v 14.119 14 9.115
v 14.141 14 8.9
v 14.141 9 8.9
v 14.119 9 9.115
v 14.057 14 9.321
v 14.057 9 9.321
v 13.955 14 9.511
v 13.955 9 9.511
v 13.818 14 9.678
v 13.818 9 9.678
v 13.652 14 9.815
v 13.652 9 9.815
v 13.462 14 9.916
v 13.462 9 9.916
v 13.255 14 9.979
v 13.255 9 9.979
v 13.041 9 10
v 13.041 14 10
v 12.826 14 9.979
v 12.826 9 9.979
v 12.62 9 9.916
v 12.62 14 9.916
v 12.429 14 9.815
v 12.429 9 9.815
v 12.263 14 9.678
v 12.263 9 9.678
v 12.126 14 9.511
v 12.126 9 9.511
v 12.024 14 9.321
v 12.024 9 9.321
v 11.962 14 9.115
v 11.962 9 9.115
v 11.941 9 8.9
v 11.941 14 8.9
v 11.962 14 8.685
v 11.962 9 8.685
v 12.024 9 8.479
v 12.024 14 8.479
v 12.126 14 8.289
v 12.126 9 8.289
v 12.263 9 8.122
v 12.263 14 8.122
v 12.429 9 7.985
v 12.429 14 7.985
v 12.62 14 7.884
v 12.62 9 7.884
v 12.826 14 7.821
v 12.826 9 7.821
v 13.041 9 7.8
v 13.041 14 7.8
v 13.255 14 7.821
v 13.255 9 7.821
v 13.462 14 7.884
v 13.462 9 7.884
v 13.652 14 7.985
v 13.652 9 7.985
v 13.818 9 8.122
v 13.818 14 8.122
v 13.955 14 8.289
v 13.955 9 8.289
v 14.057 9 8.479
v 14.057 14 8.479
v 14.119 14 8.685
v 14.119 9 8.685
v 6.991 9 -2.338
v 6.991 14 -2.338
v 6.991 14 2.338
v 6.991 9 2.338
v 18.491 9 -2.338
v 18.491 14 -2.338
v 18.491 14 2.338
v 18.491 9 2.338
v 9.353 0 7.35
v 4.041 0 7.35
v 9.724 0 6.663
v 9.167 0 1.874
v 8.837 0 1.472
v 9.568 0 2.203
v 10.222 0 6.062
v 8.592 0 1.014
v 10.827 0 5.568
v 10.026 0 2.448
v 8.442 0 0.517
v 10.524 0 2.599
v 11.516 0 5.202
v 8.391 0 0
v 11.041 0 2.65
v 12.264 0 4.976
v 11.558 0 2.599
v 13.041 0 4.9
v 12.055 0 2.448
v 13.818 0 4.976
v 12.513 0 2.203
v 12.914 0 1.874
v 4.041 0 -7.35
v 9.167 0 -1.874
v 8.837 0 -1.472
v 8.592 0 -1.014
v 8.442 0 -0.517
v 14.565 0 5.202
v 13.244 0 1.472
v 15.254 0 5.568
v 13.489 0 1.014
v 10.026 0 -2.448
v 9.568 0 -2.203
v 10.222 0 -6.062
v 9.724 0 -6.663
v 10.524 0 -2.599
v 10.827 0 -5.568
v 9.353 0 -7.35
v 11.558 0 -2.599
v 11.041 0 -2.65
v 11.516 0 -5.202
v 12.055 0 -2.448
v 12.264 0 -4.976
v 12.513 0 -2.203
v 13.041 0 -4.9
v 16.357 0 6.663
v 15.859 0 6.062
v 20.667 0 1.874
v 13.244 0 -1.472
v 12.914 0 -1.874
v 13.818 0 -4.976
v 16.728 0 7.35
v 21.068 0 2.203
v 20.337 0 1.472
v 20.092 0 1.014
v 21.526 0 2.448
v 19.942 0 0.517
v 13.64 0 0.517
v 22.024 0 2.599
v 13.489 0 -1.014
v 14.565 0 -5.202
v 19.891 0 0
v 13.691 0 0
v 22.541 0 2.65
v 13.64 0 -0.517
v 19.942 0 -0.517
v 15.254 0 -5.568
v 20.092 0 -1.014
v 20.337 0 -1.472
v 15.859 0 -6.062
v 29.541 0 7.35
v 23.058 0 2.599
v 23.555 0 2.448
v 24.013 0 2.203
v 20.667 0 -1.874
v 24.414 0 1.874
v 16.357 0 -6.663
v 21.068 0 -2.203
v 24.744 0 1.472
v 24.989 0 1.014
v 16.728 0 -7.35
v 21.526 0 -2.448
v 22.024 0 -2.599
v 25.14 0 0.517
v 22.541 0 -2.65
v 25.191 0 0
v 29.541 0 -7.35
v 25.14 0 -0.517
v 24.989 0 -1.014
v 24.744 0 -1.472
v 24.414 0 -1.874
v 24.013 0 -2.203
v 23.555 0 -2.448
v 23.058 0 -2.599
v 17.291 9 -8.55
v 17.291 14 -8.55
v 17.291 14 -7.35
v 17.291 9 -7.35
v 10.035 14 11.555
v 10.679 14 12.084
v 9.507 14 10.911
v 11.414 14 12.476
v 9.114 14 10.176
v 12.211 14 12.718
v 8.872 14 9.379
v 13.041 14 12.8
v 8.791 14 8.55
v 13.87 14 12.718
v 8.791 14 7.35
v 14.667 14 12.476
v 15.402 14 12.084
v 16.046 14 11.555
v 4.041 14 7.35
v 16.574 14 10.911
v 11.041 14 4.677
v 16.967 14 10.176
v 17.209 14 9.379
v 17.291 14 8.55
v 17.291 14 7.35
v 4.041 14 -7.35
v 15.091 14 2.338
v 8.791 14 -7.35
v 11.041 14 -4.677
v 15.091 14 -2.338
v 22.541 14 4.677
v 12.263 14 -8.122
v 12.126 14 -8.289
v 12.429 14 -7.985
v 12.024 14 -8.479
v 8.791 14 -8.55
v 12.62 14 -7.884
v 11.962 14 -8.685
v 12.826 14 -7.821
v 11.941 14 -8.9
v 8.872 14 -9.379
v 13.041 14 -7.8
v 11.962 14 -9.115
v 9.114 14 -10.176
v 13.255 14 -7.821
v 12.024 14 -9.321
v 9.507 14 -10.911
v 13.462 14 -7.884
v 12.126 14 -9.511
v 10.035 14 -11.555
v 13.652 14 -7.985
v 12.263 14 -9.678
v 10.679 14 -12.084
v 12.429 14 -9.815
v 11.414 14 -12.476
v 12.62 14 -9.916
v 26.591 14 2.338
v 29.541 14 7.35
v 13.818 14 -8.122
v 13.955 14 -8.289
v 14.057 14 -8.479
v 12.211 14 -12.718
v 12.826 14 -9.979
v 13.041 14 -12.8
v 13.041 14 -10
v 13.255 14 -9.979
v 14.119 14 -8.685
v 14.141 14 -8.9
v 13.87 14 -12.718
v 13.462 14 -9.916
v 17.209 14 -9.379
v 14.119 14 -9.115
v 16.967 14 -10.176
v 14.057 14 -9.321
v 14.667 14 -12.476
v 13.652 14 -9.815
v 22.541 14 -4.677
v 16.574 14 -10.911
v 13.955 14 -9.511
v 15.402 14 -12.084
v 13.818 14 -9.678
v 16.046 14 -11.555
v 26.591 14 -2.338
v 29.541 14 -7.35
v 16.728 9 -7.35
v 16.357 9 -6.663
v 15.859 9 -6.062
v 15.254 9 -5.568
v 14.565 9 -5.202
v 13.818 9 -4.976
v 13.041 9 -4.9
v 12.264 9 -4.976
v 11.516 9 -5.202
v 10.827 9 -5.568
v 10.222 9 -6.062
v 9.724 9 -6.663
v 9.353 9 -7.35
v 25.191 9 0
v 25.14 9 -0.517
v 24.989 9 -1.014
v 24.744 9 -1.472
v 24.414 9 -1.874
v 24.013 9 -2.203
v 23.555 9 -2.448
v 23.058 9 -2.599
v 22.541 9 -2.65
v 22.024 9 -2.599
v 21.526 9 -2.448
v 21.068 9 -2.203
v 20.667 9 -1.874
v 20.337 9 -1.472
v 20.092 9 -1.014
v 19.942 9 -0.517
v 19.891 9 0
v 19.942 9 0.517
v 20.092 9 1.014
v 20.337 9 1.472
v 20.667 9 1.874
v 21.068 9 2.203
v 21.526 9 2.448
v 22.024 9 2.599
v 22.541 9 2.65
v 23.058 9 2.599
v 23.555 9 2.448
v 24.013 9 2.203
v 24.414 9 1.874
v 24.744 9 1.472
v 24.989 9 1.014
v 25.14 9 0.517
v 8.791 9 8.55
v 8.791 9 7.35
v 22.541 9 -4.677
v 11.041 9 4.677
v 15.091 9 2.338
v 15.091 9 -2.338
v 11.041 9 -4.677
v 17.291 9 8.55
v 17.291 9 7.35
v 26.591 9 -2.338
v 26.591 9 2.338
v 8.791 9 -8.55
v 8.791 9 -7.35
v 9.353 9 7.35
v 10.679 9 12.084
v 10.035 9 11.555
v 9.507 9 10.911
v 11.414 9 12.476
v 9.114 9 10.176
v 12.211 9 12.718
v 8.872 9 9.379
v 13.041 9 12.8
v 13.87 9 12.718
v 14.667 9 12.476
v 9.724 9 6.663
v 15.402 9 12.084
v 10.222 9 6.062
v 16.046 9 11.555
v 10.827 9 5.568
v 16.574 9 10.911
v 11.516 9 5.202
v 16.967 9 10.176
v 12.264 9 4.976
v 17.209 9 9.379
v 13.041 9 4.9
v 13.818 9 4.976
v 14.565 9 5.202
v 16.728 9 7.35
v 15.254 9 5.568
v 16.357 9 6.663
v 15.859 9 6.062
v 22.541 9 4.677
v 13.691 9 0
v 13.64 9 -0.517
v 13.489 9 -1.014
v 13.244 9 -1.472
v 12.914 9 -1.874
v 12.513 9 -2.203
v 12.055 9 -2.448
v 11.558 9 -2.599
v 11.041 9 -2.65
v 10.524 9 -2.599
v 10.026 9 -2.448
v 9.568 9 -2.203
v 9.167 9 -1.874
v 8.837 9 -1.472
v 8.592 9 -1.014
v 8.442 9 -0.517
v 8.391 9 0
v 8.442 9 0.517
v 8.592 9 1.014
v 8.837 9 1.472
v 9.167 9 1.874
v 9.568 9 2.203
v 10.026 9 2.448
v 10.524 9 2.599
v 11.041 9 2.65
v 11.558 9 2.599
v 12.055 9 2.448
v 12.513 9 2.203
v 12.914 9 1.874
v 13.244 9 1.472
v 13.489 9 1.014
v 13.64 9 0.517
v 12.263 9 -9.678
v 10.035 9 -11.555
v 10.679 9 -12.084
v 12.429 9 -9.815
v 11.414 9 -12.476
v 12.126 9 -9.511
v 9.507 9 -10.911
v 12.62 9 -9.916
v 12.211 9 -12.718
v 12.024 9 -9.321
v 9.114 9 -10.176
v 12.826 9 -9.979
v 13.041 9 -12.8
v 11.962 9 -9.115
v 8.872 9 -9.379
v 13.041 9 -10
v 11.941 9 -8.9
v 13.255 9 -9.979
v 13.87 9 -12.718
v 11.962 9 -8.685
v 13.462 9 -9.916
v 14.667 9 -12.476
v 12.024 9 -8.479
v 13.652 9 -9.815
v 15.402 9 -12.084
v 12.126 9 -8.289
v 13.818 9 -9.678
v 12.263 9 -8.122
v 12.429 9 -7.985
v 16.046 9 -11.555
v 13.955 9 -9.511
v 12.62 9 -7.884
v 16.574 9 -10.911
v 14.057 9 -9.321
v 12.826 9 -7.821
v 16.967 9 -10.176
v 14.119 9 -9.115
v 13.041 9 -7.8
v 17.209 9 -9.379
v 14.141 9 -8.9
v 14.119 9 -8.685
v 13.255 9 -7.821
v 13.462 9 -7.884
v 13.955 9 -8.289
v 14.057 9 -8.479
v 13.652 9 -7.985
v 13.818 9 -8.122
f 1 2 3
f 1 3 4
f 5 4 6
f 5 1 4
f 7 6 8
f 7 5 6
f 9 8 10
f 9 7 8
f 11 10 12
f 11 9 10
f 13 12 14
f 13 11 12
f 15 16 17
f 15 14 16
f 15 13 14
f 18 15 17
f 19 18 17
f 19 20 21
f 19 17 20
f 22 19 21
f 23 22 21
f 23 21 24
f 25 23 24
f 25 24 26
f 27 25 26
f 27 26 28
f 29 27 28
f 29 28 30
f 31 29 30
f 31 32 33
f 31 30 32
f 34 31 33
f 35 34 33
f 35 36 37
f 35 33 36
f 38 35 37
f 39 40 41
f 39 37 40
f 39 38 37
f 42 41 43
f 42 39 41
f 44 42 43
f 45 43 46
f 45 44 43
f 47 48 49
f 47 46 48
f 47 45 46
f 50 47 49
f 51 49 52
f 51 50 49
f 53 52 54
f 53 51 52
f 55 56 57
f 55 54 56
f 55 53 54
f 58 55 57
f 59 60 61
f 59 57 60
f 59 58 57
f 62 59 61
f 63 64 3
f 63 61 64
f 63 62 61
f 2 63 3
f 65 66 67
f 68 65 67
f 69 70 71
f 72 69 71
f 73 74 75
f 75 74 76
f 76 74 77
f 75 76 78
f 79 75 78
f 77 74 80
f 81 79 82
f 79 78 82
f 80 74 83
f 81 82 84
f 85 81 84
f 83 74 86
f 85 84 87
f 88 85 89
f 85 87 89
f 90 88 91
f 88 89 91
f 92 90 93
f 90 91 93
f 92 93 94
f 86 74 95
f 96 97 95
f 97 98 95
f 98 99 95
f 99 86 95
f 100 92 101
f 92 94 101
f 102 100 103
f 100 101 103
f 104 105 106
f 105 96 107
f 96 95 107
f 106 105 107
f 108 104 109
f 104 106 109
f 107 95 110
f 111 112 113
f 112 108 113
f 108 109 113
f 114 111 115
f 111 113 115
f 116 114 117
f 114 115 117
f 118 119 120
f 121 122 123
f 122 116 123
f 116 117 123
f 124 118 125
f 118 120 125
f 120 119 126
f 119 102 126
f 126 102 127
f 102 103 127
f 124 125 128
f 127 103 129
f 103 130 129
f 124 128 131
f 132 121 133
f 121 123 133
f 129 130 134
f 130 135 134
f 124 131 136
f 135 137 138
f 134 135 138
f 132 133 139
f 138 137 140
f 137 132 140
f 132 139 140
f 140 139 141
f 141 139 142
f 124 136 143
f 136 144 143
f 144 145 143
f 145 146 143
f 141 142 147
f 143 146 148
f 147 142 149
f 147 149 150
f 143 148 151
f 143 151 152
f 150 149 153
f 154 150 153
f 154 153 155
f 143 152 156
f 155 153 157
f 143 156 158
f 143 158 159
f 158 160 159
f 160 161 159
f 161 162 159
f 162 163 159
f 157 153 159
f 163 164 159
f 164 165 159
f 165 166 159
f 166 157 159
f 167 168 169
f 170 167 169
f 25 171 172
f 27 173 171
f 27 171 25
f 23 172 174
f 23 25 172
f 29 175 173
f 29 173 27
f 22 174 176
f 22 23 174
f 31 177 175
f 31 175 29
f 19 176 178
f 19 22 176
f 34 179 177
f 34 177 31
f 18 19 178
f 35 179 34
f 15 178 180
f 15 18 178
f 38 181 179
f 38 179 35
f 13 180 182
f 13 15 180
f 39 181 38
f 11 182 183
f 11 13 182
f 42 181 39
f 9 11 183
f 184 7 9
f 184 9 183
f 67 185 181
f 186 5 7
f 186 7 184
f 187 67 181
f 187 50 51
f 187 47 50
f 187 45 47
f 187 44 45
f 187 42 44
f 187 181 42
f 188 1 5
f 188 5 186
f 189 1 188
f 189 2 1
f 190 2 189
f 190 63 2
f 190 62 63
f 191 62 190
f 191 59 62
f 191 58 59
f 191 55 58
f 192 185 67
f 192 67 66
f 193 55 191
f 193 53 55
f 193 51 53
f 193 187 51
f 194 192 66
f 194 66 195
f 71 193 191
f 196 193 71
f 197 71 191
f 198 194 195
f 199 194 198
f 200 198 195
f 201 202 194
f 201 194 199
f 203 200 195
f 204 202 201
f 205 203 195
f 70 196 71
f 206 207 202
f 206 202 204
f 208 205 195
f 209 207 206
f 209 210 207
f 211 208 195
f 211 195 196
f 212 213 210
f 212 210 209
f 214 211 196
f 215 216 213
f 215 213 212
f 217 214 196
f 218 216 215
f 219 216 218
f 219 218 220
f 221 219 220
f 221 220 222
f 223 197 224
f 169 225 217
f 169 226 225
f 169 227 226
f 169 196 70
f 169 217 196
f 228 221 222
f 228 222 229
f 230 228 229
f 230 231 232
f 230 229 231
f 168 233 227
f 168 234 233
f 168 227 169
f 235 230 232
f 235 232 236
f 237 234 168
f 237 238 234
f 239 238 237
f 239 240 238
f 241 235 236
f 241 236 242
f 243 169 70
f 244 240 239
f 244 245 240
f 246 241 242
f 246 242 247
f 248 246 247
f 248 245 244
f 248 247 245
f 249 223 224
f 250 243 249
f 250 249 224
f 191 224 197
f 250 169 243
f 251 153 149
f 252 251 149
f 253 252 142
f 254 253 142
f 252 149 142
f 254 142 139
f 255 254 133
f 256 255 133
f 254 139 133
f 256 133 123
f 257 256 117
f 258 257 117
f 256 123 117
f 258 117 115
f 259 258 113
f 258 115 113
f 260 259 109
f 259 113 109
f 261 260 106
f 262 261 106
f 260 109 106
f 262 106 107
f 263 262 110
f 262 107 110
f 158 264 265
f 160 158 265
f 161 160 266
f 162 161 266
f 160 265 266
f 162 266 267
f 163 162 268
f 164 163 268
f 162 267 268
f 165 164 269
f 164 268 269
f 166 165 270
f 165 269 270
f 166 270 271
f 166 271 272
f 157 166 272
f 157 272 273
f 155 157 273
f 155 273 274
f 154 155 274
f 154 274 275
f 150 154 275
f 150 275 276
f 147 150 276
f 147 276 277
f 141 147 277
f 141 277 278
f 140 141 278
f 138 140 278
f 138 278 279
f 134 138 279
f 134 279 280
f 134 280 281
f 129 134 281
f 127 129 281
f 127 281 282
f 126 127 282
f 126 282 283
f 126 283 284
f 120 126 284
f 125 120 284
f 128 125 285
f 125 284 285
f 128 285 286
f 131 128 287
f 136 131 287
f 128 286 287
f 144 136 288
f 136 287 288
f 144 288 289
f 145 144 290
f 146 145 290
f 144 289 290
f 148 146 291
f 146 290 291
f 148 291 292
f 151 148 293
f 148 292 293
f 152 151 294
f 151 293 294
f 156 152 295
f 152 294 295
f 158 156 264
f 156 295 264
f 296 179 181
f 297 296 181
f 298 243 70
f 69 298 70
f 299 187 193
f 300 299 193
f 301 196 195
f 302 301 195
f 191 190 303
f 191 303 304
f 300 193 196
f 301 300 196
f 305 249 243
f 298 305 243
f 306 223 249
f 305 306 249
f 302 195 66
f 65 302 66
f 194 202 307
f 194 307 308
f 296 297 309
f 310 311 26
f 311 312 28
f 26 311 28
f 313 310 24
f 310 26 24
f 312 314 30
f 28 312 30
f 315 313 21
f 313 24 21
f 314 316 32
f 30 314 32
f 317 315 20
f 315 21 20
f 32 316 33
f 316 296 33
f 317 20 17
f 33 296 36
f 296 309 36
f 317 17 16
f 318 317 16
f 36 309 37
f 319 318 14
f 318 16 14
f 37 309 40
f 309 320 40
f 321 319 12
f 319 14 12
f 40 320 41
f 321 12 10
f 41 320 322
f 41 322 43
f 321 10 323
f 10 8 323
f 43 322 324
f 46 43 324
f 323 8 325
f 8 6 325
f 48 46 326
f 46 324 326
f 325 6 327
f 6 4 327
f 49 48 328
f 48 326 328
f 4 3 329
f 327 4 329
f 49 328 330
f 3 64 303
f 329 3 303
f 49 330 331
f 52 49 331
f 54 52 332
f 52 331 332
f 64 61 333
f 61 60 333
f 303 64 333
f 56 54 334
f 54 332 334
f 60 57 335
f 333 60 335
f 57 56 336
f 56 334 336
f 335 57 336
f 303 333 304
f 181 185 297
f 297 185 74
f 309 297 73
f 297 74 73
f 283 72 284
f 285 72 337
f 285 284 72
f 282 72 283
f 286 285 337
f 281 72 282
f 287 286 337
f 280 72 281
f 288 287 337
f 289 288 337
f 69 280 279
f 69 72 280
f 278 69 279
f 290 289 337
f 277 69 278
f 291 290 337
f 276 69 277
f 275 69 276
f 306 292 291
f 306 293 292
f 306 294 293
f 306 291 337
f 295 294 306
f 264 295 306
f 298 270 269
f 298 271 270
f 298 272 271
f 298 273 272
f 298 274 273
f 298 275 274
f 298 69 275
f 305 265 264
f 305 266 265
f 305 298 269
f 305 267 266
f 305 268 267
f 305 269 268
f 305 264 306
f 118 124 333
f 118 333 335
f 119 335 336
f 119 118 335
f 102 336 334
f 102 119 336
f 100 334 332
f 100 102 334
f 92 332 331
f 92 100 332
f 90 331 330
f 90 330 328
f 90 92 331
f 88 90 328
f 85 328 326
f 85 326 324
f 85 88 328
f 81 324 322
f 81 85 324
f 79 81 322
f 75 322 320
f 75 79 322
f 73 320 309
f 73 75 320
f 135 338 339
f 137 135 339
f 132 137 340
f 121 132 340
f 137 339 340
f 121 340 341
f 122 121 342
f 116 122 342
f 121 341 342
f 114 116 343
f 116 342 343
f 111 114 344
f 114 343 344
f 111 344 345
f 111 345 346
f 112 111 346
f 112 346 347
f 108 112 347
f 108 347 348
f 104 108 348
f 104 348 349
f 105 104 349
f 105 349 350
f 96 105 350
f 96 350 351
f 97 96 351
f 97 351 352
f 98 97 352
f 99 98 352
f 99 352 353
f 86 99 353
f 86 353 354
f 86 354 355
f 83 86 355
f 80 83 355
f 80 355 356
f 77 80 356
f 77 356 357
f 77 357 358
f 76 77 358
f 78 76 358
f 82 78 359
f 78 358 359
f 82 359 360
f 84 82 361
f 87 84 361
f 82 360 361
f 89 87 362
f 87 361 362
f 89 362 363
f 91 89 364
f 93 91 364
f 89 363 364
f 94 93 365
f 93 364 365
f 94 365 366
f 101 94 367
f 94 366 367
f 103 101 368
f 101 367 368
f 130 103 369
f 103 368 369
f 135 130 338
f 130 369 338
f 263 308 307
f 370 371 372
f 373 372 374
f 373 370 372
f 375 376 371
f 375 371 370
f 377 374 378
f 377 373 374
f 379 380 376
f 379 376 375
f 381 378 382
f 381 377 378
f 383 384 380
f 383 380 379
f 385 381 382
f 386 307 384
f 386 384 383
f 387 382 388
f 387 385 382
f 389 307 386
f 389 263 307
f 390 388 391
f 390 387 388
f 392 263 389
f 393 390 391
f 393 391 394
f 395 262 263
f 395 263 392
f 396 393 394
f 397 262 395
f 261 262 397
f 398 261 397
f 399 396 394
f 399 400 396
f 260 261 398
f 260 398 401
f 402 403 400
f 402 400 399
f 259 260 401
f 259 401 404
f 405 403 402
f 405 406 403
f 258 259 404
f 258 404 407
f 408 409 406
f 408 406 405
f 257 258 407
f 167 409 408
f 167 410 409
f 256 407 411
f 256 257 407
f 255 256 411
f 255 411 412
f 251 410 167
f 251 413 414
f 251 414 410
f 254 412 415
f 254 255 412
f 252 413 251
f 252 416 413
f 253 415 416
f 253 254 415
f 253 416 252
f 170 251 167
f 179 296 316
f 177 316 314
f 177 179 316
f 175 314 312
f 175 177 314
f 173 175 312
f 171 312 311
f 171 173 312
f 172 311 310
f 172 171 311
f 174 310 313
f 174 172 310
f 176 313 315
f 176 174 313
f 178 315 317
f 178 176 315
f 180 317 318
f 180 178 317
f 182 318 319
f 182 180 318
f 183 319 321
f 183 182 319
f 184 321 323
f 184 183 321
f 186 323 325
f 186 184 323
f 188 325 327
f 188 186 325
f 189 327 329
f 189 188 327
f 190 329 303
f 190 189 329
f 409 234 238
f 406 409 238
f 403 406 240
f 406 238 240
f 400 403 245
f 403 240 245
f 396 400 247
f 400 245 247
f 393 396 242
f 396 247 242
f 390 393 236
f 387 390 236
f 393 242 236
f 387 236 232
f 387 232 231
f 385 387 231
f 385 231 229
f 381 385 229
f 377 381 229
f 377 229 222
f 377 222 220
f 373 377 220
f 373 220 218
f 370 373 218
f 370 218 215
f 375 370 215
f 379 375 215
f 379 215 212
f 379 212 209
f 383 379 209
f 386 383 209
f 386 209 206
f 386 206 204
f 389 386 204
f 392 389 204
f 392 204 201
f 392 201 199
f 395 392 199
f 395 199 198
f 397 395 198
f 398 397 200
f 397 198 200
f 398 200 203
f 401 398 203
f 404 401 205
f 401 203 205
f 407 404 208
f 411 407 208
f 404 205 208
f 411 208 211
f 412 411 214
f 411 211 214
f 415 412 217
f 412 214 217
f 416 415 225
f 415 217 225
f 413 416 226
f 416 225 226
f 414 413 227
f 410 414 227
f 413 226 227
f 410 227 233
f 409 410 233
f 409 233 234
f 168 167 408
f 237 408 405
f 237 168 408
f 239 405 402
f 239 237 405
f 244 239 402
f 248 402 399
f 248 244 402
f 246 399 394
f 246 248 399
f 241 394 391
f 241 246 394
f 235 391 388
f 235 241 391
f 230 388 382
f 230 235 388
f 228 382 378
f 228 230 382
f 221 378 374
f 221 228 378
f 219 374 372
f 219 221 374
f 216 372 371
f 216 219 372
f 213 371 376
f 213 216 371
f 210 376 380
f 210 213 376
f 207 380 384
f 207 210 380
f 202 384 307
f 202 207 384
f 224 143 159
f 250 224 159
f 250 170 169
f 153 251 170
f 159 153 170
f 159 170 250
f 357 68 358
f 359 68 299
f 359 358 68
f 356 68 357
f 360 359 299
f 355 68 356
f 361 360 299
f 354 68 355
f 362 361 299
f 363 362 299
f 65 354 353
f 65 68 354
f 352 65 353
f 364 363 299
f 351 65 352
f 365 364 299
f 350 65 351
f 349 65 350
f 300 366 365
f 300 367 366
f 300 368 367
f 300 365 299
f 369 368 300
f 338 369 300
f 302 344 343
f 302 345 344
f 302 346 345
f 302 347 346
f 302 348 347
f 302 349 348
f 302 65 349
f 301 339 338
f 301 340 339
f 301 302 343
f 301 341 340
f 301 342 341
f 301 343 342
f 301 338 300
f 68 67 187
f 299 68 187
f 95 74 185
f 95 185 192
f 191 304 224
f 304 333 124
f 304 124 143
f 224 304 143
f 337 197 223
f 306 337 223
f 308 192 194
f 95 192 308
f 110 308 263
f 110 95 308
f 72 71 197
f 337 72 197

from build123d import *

# Parameters (mm, degrees)
SKETCH_1_W                    = 25.5
SKETCH_1_H                    = 14.7
EXTRUDE_385_DEPTH             = 14
SKETCH_4_W                    = 8.5
SKETCH_4_H                    = 5.45
EXTRUDE_2_DEPTH               = 5
FILLET_1_RADIUS               = 4.25
FILLET_1_LENGTH               = 5
HOLE_WIZARD_M2_1_D            = 2.2
SKETCH_7_R                    = 4
CUT_EXTRUDE_3_DEPTH           = 9
FILLET_1_OF_MIRROR_1_2_RADIUS = 4.25
FILLET_1_OF_MIRROR_1_2_LENGTH = 5
HOLE_WIZARD_M5_1_D            = 5.3
CUT_EXTRUDE_4_DEPTH           = 5


with BuildPart() as part:
    # 草图1 → Extrude 385 (new body)
    with BuildSketch(Plane(origin=(0, 0, 0), x_dir=(1, 0, 0), z_dir=(0, 1, 0))):
        with Locations((16.790583128, 0)):
            Rectangle(SKETCH_1_W, SKETCH_1_H)
    extrude(amount=EXTRUDE_385_DEPTH)

    # 草图4 → 凸台-拉伸2 (add)
    with BuildSketch(Plane.XZ.offset(-14)):
        with Locations((13.040583128, -10.075)):
            Rectangle(SKETCH_4_W, SKETCH_4_H)
    extrude_2 = extrude(amount=EXTRUDE_2_DEPTH)

    # 圆角1: full round fillet: the end face becomes a half cylinder, R = half its width
    fillet_1_face = Plane((13.040583128, 11.5, -12.8), x_dir=(0, 1, 0), z_dir=(0, 0, -1))  # on the end face: x along it, z out of the body
    fillet_1_slab = fillet_1_face.offset(-FILLET_1_RADIUS / 2) * Box(FILLET_1_LENGTH, 2 * FILLET_1_RADIUS, FILLET_1_RADIUS, mode=Mode.PRIVATE)  # the body's end, R deep
    fillet_1_round = Plane((13.040583128, 11.5, -8.55), x_dir=(0, 0, -1), z_dir=(0, 1, 0)) * Cylinder(FILLET_1_RADIUS, FILLET_1_LENGTH, mode=Mode.PRIVATE)  # its axis R under the face
    add(fillet_1_slab - fillet_1_round, mode=Mode.SUBTRACT)

    # M2 间隙孔1 (through all)
    with Locations(Plane(origin=(0, 9, 0), x_dir=(-1, 0, 0), z_dir=(0, -1, 0))):
        with Locations((-13.040583128, 8.9)):
            hole_wizard_m2_1 = Hole(HOLE_WIZARD_M2_1_D / 2)

    # 草图7 → 切除-拉伸3 (cut)
    with BuildSketch(Plane.XZ):
        with Locations((13.040583128, -8.9)):
            Circle(SKETCH_7_R)
    cut_extrude_3 = extrude(amount=-CUT_EXTRUDE_3_DEPTH, mode=Mode.SUBTRACT)

    # 镜向1: 凸台-拉伸2, M2 间隙孔1, 切除-拉伸3 across plane
    add(extrude_2.mirror(Plane.XY))
    add(hole_wizard_m2_1.mirror(Plane.XY), mode=Mode.SUBTRACT)
    add(cut_extrude_3.mirror(Plane.XY), mode=Mode.SUBTRACT)

    # 圆角1 of Mirror 1 2: full round fillet: the end face becomes a half cylinder, R = half its width
    fillet_1_of_mirror_1_2_face = Plane((13.040583128, 11.5, 12.8), x_dir=(0, 1, 0), z_dir=(0, 0, 1))  # on the end face: x along it, z out of the body
    fillet_1_of_mirror_1_2_slab = fillet_1_of_mirror_1_2_face.offset(-FILLET_1_OF_MIRROR_1_2_RADIUS / 2) * Box(FILLET_1_OF_MIRROR_1_2_LENGTH, 2 * FILLET_1_OF_MIRROR_1_2_RADIUS, FILLET_1_OF_MIRROR_1_2_RADIUS, mode=Mode.PRIVATE)  # the body's end, R deep
    fillet_1_of_mirror_1_2_round = Plane((13.040583128, 11.5, 8.55), x_dir=(0, 0, 1), z_dir=(0, 1, 0)) * Cylinder(FILLET_1_OF_MIRROR_1_2_RADIUS, FILLET_1_OF_MIRROR_1_2_LENGTH, mode=Mode.PRIVATE)  # its axis R under the face
    add(fillet_1_of_mirror_1_2_slab - fillet_1_of_mirror_1_2_round, mode=Mode.SUBTRACT)

    # M5 间隙孔1 (through all)
    with Locations(Plane(origin=(0, 0, 0), x_dir=(-1, 0, 0), z_dir=(0, -1, 0))):
        with Locations((-22.540583128, 0), (-11.040583128, 0)):
            Hole(HOLE_WIZARD_M5_1_D / 2)

    # 草图10 → 切除-拉伸4 (cut)
    with BuildSketch(Plane(origin=(0, 14, 0), x_dir=(1, 0, 0), z_dir=(0, 1, 0))):
        Polygon((11.040583128, 4.67653718), (6.990583128, 2.33826859), (6.990583128, -2.33826859), (11.040583128, -4.67653718), (15.090583128, -2.33826859), (15.090583128, 2.33826859), align=None)
        Polygon((22.540583128, 4.67653718), (18.490583128, 2.33826859), (18.490583128, -2.33826859), (22.540583128, -4.67653718), (26.590583128, -2.33826859), (26.590583128, 2.33826859), align=None)
    extrude(amount=-CUT_EXTRUDE_4_DEPTH, mode=Mode.SUBTRACT)


solid = part.part
